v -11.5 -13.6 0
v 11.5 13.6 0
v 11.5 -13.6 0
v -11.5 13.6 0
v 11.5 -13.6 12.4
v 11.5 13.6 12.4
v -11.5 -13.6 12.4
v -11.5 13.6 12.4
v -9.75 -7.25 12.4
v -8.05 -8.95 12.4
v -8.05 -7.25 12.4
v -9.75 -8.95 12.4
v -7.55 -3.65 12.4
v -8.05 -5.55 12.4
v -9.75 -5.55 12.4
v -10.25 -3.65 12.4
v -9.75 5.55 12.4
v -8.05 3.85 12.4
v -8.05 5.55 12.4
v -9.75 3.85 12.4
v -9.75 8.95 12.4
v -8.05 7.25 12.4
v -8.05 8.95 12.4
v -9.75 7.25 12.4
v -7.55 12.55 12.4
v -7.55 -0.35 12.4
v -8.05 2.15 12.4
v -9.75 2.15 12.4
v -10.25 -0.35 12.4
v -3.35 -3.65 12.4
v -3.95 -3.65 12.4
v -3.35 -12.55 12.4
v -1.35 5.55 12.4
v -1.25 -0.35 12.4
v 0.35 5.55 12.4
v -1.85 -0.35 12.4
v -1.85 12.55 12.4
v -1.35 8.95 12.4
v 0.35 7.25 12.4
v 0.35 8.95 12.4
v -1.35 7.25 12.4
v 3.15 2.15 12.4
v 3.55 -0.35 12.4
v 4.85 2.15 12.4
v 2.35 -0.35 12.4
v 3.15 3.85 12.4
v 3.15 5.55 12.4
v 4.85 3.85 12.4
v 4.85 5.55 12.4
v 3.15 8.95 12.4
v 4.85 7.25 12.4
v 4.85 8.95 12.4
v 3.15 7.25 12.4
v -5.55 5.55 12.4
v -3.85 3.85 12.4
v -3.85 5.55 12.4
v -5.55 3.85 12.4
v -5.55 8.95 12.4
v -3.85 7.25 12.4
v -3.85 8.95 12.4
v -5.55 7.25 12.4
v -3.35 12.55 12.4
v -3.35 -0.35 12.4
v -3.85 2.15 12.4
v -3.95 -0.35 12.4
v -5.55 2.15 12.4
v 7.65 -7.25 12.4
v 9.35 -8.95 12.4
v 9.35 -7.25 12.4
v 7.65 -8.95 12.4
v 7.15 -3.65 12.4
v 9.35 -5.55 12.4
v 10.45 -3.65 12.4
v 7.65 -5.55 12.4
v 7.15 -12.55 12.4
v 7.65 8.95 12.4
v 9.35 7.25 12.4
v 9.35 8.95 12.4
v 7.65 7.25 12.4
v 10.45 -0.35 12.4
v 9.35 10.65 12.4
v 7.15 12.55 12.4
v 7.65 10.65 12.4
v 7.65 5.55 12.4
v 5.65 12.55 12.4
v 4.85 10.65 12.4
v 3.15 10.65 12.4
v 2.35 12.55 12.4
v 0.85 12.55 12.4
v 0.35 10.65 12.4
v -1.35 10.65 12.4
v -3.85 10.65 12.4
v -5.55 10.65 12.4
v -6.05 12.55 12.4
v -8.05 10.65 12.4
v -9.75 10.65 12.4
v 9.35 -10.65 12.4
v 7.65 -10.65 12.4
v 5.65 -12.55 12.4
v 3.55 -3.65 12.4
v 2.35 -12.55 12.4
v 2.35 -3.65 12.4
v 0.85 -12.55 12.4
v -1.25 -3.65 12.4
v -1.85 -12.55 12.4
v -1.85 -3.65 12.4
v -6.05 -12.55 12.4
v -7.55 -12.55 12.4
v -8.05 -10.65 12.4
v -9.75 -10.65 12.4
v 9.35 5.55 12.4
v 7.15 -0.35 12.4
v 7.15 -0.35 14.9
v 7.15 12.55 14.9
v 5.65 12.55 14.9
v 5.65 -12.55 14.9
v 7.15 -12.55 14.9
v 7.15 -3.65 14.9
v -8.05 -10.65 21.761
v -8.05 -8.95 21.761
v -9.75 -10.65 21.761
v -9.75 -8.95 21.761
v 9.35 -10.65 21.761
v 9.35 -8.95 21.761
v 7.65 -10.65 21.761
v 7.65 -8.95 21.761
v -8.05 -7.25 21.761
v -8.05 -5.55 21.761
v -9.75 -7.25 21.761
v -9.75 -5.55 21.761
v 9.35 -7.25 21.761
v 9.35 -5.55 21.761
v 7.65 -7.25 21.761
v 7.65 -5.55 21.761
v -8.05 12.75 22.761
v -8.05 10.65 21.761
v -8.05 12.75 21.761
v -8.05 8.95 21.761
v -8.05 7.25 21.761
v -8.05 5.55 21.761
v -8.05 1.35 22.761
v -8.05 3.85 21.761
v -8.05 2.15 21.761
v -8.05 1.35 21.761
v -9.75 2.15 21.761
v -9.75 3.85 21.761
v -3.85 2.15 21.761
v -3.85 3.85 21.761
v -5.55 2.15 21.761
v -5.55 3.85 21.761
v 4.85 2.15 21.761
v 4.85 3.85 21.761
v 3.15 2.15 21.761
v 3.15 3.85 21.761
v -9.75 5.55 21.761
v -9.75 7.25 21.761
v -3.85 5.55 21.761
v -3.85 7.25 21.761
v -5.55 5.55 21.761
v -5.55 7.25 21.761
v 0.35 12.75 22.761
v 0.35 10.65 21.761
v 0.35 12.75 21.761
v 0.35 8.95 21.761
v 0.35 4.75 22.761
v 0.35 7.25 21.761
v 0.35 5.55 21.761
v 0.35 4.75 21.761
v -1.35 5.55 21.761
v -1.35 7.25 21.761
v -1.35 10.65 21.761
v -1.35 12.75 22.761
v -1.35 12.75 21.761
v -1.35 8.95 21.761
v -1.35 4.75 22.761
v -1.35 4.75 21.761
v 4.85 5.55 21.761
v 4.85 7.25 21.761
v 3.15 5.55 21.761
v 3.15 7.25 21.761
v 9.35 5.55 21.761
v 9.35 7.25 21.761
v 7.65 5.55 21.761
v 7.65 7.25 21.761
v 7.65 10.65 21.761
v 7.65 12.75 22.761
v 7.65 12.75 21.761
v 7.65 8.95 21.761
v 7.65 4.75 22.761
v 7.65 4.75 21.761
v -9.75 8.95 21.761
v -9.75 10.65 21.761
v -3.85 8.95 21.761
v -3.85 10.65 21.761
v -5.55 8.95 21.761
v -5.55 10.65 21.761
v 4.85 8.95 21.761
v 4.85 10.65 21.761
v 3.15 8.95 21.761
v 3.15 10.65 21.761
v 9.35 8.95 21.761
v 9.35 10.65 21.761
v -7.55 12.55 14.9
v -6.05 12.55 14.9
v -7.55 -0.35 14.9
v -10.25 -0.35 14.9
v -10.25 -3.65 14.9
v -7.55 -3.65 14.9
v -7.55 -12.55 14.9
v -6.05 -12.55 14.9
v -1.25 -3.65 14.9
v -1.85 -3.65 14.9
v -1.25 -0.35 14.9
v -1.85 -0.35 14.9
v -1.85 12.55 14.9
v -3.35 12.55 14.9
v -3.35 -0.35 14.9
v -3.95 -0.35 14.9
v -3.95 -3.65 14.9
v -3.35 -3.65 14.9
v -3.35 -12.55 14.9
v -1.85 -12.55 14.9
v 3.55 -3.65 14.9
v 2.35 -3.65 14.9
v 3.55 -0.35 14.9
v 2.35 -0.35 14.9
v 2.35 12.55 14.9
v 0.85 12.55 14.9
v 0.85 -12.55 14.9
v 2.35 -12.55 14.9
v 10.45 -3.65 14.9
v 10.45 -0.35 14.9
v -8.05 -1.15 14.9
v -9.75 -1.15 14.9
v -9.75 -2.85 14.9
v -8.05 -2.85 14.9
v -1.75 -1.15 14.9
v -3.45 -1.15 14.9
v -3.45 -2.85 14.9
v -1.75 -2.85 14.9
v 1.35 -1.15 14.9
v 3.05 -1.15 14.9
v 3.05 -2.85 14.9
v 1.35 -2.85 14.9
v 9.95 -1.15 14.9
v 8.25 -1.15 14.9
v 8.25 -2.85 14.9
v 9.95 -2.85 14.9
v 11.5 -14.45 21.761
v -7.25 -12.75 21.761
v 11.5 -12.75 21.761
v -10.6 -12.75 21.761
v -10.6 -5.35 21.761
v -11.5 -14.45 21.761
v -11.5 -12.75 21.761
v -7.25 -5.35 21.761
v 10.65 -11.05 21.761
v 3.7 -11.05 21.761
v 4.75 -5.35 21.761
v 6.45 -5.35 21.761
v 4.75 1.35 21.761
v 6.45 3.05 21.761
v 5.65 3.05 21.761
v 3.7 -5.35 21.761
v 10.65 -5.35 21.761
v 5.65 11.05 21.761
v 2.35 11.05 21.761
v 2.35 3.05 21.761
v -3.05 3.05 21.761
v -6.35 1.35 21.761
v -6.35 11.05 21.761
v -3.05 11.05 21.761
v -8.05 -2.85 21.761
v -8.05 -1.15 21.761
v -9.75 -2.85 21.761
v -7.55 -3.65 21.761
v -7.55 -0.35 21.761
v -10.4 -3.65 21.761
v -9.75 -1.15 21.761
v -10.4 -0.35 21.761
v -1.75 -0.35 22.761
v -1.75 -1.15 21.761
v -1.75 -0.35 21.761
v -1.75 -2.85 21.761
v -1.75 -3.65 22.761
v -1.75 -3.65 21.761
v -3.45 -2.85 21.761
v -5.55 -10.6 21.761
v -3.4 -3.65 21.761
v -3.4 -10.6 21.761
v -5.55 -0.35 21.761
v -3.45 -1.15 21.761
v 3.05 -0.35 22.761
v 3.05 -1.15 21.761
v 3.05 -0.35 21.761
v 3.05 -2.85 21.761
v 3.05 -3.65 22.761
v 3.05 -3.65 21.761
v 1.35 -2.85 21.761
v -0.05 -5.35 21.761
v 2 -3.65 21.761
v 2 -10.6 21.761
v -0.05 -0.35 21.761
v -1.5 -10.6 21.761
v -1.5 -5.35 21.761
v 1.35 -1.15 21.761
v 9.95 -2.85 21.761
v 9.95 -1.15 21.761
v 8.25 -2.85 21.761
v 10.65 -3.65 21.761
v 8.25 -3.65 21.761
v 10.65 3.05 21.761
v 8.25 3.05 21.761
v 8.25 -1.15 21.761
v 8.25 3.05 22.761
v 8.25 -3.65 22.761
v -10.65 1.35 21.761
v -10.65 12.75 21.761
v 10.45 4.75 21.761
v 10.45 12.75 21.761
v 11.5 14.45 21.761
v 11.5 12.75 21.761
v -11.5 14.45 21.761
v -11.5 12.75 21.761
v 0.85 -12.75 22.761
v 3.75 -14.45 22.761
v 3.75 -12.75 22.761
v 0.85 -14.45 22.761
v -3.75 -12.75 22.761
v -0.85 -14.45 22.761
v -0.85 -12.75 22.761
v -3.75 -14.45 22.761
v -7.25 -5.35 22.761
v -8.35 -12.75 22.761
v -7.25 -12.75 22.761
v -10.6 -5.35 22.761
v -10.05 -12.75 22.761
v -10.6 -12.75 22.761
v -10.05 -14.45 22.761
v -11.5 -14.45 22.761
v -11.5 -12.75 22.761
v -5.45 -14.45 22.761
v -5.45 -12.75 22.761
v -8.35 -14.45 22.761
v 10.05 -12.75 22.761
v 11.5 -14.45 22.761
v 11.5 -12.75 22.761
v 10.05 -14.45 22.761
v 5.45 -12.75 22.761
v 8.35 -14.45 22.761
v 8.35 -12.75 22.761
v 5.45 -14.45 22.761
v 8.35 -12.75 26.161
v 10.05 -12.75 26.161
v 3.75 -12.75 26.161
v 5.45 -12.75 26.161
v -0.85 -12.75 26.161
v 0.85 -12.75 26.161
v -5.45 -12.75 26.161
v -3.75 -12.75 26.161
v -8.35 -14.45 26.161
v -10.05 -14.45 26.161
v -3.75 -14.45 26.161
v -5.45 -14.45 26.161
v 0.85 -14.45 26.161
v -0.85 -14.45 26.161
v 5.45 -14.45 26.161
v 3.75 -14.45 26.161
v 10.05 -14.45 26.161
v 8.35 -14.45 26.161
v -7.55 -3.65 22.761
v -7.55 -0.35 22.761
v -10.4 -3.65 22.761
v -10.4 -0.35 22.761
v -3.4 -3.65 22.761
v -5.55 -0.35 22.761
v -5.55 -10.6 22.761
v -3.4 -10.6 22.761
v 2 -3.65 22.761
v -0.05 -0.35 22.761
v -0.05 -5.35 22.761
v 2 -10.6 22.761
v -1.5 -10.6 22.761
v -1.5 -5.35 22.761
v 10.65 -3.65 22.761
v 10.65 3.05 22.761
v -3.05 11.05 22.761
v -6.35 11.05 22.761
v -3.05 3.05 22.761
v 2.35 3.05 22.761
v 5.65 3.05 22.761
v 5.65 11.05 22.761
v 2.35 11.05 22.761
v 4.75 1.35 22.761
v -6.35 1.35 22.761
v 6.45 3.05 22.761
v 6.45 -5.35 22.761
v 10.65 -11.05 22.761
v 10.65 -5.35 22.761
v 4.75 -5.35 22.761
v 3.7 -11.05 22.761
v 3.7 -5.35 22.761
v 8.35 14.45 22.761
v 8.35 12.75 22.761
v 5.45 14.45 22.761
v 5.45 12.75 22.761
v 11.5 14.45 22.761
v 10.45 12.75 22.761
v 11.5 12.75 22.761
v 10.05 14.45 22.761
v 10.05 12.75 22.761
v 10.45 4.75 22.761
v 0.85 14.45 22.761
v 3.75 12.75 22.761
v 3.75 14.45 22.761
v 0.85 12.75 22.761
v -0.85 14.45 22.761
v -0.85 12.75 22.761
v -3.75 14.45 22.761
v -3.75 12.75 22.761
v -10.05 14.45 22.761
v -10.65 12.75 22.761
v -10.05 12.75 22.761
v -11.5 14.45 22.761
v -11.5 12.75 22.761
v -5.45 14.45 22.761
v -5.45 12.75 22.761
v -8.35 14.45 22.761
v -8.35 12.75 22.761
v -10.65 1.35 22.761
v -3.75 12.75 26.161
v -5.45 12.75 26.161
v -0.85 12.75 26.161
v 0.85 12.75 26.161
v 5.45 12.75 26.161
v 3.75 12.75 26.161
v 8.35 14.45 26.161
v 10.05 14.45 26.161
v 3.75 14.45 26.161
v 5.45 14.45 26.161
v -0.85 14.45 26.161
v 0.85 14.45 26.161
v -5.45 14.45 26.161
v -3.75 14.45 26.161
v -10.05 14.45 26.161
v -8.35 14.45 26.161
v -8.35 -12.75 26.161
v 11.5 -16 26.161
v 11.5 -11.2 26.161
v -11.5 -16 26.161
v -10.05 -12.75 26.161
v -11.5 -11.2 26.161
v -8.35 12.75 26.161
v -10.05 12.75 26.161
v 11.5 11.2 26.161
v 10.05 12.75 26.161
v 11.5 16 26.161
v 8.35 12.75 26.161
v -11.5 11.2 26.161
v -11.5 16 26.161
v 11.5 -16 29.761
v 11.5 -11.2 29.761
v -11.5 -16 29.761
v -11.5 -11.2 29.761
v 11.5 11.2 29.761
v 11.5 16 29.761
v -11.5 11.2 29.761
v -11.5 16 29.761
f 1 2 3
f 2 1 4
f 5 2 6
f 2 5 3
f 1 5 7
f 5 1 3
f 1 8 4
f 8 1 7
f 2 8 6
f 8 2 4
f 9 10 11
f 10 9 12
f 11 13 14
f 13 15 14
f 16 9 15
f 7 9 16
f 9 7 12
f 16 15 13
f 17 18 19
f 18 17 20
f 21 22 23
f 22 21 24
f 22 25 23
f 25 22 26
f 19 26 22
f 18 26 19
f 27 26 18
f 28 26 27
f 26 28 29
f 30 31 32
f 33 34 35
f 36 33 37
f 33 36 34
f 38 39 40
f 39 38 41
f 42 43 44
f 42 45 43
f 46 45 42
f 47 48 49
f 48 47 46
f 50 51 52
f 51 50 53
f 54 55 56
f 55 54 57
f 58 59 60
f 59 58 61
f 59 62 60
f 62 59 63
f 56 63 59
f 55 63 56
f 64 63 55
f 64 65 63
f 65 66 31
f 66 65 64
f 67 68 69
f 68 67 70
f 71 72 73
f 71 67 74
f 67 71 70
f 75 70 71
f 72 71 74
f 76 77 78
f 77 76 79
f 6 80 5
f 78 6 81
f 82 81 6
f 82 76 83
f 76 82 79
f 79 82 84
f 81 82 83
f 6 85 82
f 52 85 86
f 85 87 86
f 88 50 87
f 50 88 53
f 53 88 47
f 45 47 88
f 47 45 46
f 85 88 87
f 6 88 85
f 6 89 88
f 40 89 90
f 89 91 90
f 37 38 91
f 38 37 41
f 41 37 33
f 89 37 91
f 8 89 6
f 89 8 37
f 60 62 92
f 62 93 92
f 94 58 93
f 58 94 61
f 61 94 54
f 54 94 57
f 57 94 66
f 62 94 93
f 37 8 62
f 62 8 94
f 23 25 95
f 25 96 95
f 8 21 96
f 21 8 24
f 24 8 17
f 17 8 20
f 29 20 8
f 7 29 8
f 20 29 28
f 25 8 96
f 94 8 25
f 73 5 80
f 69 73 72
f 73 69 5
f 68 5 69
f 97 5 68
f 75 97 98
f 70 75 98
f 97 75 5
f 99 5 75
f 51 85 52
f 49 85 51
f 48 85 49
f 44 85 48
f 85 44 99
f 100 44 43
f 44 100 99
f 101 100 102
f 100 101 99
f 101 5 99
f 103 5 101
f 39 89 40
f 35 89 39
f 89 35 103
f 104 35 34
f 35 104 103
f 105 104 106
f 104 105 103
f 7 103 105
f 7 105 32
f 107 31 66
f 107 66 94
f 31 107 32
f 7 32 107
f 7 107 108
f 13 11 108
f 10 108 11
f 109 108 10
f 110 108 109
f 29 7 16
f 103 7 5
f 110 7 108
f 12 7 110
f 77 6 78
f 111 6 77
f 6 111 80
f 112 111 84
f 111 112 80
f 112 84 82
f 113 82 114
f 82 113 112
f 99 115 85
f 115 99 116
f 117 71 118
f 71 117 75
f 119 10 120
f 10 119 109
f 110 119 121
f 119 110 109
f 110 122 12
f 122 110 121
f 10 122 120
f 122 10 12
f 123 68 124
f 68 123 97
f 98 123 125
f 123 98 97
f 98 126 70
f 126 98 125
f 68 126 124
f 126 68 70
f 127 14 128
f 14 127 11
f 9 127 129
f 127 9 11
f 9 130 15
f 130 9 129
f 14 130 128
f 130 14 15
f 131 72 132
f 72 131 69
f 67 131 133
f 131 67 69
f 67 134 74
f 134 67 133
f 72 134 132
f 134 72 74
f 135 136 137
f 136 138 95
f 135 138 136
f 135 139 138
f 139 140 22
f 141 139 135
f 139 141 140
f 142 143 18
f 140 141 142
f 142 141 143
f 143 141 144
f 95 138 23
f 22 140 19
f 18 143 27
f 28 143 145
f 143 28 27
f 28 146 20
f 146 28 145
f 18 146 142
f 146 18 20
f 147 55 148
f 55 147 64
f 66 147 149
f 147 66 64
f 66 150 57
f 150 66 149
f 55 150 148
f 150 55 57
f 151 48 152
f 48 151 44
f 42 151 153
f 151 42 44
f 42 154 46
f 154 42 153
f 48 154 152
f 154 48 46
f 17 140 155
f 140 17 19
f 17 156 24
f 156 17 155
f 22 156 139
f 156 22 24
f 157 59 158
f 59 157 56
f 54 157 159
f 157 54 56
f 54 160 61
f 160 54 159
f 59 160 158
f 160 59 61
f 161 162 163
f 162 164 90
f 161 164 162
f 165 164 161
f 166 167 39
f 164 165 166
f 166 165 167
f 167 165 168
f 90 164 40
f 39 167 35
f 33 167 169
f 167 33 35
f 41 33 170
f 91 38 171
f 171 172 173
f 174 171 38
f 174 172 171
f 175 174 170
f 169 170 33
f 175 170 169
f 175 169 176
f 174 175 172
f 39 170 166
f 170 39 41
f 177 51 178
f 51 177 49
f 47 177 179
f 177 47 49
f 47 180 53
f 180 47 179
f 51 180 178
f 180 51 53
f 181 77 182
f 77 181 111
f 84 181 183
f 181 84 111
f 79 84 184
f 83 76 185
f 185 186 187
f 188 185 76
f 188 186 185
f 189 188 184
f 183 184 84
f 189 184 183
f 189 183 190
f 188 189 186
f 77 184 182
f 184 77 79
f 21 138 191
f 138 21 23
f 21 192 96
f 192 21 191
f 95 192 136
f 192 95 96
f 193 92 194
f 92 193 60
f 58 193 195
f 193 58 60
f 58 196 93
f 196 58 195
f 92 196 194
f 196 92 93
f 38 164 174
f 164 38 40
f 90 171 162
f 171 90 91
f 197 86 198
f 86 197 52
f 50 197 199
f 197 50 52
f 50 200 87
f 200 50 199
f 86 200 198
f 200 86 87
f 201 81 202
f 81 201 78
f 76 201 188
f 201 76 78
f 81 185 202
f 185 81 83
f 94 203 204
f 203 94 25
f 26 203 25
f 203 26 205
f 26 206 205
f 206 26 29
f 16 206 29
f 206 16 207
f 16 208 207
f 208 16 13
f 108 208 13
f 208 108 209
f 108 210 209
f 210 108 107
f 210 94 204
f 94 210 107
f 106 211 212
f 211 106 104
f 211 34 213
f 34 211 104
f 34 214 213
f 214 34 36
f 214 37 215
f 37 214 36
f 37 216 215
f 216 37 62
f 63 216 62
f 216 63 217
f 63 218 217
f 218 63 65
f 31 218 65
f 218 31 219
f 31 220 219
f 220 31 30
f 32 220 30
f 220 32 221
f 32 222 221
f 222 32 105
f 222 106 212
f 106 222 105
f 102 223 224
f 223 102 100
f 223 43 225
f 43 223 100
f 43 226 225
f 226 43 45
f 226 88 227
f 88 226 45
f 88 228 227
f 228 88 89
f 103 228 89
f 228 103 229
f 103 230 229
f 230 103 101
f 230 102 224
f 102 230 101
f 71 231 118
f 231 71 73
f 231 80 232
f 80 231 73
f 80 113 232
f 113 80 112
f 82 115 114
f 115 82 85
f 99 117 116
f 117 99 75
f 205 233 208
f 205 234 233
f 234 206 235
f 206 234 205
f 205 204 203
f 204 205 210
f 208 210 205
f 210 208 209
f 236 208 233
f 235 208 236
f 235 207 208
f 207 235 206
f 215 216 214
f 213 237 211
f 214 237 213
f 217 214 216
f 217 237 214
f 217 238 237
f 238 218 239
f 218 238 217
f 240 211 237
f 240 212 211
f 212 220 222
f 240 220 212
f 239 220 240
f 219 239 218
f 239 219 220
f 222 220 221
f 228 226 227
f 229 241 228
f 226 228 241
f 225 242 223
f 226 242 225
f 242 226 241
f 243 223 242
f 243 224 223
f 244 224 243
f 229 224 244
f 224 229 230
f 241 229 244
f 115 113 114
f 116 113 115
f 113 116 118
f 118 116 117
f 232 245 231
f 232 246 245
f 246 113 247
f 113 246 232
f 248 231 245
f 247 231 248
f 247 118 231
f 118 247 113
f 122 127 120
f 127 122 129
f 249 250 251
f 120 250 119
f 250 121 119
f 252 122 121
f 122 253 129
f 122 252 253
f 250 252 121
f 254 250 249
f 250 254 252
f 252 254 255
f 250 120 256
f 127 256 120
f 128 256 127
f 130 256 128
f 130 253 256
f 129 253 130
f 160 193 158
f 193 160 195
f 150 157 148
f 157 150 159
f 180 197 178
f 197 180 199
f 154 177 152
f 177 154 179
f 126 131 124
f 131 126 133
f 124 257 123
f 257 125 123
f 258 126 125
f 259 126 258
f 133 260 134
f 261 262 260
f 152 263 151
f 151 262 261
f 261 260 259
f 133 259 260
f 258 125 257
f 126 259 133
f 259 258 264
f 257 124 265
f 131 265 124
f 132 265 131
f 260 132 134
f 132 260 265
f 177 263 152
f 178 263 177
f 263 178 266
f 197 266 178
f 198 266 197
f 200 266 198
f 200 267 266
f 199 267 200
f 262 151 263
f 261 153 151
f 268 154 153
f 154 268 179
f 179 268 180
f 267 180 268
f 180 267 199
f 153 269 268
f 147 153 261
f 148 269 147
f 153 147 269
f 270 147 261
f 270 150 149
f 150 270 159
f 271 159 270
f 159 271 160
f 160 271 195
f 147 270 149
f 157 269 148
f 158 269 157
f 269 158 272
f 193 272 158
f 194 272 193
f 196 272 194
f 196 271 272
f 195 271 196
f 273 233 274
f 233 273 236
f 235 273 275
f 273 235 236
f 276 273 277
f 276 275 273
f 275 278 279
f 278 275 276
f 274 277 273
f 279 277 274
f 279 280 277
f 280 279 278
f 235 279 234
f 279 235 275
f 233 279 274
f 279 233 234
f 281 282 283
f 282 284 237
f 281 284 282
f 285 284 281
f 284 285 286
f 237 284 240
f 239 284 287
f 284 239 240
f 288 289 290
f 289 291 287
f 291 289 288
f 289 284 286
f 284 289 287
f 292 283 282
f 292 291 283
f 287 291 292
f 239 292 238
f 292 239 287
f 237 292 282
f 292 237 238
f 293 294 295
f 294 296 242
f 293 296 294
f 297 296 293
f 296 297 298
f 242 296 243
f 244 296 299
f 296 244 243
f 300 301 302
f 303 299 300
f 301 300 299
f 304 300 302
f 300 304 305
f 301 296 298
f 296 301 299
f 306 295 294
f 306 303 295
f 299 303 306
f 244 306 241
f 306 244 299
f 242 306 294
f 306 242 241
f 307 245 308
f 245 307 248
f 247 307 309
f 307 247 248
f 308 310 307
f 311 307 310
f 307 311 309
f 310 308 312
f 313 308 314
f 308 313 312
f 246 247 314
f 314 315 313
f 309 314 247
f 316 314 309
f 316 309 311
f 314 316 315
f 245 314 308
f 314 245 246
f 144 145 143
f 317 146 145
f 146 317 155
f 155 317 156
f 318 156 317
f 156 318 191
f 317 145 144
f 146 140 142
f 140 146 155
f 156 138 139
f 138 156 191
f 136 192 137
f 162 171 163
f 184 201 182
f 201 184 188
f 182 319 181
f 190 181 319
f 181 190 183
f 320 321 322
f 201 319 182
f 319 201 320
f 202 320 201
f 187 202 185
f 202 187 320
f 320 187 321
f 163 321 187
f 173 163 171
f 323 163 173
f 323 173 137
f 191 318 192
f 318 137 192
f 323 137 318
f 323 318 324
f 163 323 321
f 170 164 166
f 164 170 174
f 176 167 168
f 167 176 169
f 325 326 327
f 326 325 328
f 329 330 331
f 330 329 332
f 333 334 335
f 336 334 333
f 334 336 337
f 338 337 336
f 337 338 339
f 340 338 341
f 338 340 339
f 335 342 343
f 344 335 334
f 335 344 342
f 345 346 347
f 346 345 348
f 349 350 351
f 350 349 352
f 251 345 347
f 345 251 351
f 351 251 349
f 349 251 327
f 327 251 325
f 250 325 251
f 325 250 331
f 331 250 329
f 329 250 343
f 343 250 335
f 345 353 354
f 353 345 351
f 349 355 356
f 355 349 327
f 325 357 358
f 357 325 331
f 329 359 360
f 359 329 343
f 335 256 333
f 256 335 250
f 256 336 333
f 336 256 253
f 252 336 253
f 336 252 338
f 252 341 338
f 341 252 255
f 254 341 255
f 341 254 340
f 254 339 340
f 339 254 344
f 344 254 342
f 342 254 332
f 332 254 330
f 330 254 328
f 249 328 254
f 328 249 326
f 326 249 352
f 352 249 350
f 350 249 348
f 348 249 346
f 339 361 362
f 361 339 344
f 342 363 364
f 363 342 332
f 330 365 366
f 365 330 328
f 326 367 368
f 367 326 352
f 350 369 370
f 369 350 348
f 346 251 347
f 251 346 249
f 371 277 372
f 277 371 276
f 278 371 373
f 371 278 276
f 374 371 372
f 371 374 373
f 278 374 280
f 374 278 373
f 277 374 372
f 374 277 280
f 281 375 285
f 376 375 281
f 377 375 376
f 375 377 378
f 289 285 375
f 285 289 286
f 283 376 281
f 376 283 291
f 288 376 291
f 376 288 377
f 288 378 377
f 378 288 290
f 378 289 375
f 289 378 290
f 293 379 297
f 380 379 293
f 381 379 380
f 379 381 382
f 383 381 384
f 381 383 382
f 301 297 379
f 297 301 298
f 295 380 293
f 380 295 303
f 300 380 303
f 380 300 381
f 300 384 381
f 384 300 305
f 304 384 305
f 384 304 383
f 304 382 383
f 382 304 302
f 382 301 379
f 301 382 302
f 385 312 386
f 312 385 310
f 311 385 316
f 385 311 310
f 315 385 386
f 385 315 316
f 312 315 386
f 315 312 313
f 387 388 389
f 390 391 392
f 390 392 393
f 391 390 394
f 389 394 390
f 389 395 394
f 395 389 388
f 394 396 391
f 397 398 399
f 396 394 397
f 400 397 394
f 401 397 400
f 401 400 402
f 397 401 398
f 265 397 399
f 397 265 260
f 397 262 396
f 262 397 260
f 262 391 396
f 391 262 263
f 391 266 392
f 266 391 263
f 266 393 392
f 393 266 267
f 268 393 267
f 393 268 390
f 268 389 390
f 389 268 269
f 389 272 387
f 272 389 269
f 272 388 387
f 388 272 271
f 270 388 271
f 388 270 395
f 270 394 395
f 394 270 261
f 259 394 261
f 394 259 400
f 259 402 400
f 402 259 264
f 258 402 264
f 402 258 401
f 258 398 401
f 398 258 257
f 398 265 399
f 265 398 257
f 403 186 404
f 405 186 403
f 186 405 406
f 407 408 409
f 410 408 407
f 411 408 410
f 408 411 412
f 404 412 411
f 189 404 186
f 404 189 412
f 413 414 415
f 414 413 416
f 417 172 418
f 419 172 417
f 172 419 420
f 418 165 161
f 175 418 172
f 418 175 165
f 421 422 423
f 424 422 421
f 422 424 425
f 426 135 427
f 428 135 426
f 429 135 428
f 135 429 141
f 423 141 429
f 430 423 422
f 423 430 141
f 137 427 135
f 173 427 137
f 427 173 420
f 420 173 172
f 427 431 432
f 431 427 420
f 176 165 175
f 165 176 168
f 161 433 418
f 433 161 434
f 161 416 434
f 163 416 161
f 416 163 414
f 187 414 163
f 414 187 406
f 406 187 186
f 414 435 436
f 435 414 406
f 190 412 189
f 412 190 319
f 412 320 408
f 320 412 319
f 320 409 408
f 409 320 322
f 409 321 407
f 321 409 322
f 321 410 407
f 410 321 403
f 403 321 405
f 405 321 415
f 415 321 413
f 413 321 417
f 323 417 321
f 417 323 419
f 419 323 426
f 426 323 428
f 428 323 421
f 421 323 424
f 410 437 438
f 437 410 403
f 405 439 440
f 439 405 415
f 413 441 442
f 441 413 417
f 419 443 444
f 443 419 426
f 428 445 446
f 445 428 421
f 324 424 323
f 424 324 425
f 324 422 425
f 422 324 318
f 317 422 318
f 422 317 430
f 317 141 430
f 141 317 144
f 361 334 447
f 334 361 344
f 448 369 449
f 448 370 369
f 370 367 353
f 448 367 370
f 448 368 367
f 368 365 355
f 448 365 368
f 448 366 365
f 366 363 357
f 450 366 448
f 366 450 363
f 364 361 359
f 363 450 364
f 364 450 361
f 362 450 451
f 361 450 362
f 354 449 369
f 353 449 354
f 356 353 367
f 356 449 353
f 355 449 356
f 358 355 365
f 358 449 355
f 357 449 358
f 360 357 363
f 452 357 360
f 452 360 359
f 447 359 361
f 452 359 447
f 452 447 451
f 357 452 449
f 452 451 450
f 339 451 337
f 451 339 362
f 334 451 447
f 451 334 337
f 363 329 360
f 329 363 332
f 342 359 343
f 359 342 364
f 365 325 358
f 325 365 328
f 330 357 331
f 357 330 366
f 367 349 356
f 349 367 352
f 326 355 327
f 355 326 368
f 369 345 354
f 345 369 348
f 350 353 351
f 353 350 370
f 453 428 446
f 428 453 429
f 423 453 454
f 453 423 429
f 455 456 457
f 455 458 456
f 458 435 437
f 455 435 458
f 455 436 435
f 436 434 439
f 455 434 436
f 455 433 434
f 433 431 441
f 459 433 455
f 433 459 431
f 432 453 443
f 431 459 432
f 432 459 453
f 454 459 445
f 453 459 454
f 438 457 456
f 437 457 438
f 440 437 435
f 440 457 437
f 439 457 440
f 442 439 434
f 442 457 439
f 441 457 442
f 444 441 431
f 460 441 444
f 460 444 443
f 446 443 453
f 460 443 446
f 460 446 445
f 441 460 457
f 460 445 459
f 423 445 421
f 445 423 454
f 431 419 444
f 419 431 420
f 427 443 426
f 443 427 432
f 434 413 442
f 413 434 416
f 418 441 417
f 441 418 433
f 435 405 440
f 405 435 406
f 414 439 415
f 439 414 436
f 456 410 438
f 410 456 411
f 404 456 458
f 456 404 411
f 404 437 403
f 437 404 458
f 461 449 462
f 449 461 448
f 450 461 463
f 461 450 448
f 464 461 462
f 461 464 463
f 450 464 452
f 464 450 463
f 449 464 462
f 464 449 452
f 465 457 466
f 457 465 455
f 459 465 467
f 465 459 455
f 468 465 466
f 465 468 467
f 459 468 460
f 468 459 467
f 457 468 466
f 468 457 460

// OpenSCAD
// Generated by SolidPython 0.4.2 on 2020-09-29 23:21:28
//!OpenSCAD

scale(v = 0.0100000000) {
	translate(v = [-1150, -1360, 0]) {
		union() {
			color(c = [0.4000000000, 0.4000000000, 0.4000000000]) {
				translate(v = [0, 0, 0]) {
					linear_extrude(height = 1000.0000000000) {
						polygon(paths = [[0, 1, 2, 3]], points = [[0, 0], [0, 2720], [2300, 2720], [2300, 0]]);
					}
				}
			}
			color(c = [0.2000000000, 0.6000000000, 0.2000000000]) {
				translate(v = [0, 0, 1000.0000000000]) {
					linear_extrude(height = 120.0000000000) {
						polygon(paths = [[0, 1, 2, 3]], points = [[0, 1305], [0, 2720], [2300, 2720], [2300, 1305]]);
					}
				}
			}
			color(c = [0.4000000000, 0.4000000000, 0.4000000000]) {
				translate(v = [0, 0, 1000.0000000000]) {
					linear_extrude(height = 120.0000000000) {
						polygon(paths = [[0, 1, 2, 3]], points = [[0, 0], [0, 1305], [2300, 1305], [2300, 0]]);
					}
				}
			}
			color(c = [0.9000000000, 0.6000000000, 0.6000000000]) {
				translate(v = [0, 0, 1120.0000000000]) {
					linear_extrude(height = 120.0000000000) {
						polygon(paths = [[0, 1, 2, 3]], points = [[135, 1485], [135, 2485], [395, 2485], [395, 1485]]);
					}
				}
			}
			color(c = [0.9000000000, 0.6000000000, 0.6000000000]) {
				translate(v = [0, 0, 1120.0000000000]) {
					linear_extrude(height = 120.0000000000) {
						polygon(paths = [[0, 1, 2, 3]], points = [[545, 1485], [545, 2485], [815, 2485], [815, 1485]]);
					}
				}
			}
			color(c = [0.9000000000, 0.6000000000, 0.6000000000]) {
				translate(v = [0, 0, 1120.0000000000]) {
					linear_extrude(height = 120.0000000000) {
						polygon(paths = [[0, 1, 2, 3]], points = [[965, 1485], [965, 2485], [1235, 2485], [1235, 1485]]);
					}
				}
			}
			color(c = [0.9000000000, 0.6000000000, 0.6000000000]) {
				translate(v = [0, 0, 1120.0000000000]) {
					linear_extrude(height = 120.0000000000) {
						polygon(paths = [[0, 1, 2, 3]], points = [[1385, 1485], [1385, 2485], [1715, 2485], [1715, 1485]]);
					}
				}
			}
			color(c = [0.9000000000, 0.6000000000, 0.6000000000]) {
				translate(v = [0, 0, 1120.0000000000]) {
					linear_extrude(height = 120.0000000000) {
						polygon(paths = [[0, 1, 2, 3]], points = [[1865, 1485], [1865, 2485], [2165, 2485], [2165, 1485]]);
					}
				}
			}
			color(c = [0.9000000000, 0.6000000000, 0.9000000000]) {
				translate(v = [0, 0, 1120.0000000000]) {
					linear_extrude(height = 120.0000000000) {
						polygon(paths = [[0, 1, 2, 3]], points = [[135, 235], [135, 885], [395, 885], [395, 235]]);
					}
				}
			}
			color(c = [0.9000000000, 0.6000000000, 0.9000000000]) {
				translate(v = [0, 0, 1120.0000000000]) {
					linear_extrude(height = 120.0000000000) {
						polygon(paths = [[0, 1, 2, 3]], points = [[545, 235], [545, 885], [815, 885], [815, 235]]);
					}
				}
			}
			color(c = [0.9000000000, 0.6000000000, 0.9000000000]) {
				translate(v = [0, 0, 1120.0000000000]) {
					linear_extrude(height = 120.0000000000) {
						polygon(paths = [[0, 1, 2, 3]], points = [[965, 235], [965, 885], [1235, 885], [1235, 235]]);
					}
				}
			}
			color(c = [0.9000000000, 0.6000000000, 0.9000000000]) {
				translate(v = [0, 0, 1120.0000000000]) {
					linear_extrude(height = 120.0000000000) {
						polygon(paths = [[0, 1, 2, 3]], points = [[1385, 235], [1385, 885], [1715, 885], [1715, 235]]);
					}
				}
			}
			color(c = [0.9000000000, 0.6000000000, 0.9000000000]) {
				translate(v = [0, 0, 1120.0000000000]) {
					linear_extrude(height = 120.0000000000) {
						polygon(paths = [[0, 1, 2, 3]], points = [[1865, 235], [1865, 885], [2165, 885], [2165, 235]]);
					}
				}
			}
			color(c = [0.2000000000, 0.6000000000, 0.2000000000]) {
				translate(v = [0, 0, 1120.0000000000]) {
					linear_extrude(height = 120.0000000000) {
						difference() {
							polygon(paths = [[0, 1, 2, 3]], points = [[0, 1305], [0, 2720], [2300, 2720], [2300, 1305]]);
							polygon(paths = [[0, 1, 2, 3]], points = [[135, 1485], [395, 1485], [395, 2485], [135, 2485]]);
							polygon(paths = [[0, 1, 2, 3]], points = [[545, 1485], [815, 1485], [815, 2485], [545, 2485]]);
							polygon(paths = [[0, 1, 2, 3]], points = [[965, 1485], [1235, 1485], [1235, 2485], [965, 2485]]);
							polygon(paths = [[0, 1, 2, 3]], points = [[1385, 1485], [1715, 1485], [1715, 2485], [1385, 2485]]);
							polygon(paths = [[0, 1, 2, 3]], points = [[1865, 1485], [2165, 1485], [2165, 2485], [1865, 2485]]);
						}
					}
				}
			}
			color(c = [0.4000000000, 0.4000000000, 0.4000000000]) {
				translate(v = [0, 0, 1120.0000000000]) {
					linear_extrude(height = 120.0000000000) {
						difference() {
							polygon(paths = [[0, 1, 2, 3]], points = [[0, 0], [0, 1305], [2300, 1305], [2300, 0]]);
							polygon(paths = [[0, 1, 2, 3]], points = [[135, 235], [395, 235], [395, 885], [135, 885]]);
							polygon(paths = [[0, 1, 2, 3]], points = [[545, 235], [815, 235], [815, 885], [545, 885]]);
							polygon(paths = [[0, 1, 2, 3]], points = [[965, 235], [1235, 235], [1235, 885], [965, 885]]);
							polygon(paths = [[0, 1, 2, 3]], points = [[1385, 235], [1715, 235], [1715, 885], [1385, 885]]);
							polygon(paths = [[0, 1, 2, 3]], points = [[1865, 235], [2165, 235], [2165, 885], [1865, 885]]);
						}
					}
				}
			}
			color(c = [0.1000000000, 0.1000000000, 0.1000000000]) {
				translate(v = [0, 0, 1240.0000000000]) {
					linear_extrude(height = 70.0000000000) {
						polygon(paths = [[0, 1, 2, 3]], points = [[175, 295], [175, 465], [345, 465], [345, 295]]);
					}
				}
			}
			color(c = [0.1000000000, 0.1000000000, 0.1000000000]) {
				translate(v = [0, 0, 1240.0000000000]) {
					linear_extrude(height = 70.0000000000) {
						polygon(paths = [[0, 1, 2, 3]], points = [[1915, 295], [1915, 465], [2085, 465], [2085, 295]]);
					}
				}
			}
			color(c = [0.1000000000, 0.1000000000, 0.1000000000]) {
				translate(v = [0, 0, 1240.0000000000]) {
					linear_extrude(height = 70.0000000000) {
						polygon(paths = [[0, 1, 2, 3]], points = [[175, 635], [175, 805], [345, 805], [345, 635]]);
					}
				}
			}
			color(c = [0.1000000000, 0.1000000000, 0.1000000000]) {
				translate(v = [0, 0, 1240.0000000000]) {
					linear_extrude(height = 70.0000000000) {
						polygon(paths = [[0, 1, 2, 3]], points = [[1915, 635], [1915, 805], [2085, 805], [2085, 635]]);
					}
				}
			}
			color(c = [0.1000000000, 0.1000000000, 0.1000000000]) {
				translate(v = [0, 0, 1240.0000000000]) {
					linear_extrude(height = 70.0000000000) {
						polygon(paths = [[0, 1, 2, 3]], points = [[175, 1575], [175, 1745], [345, 1745], [345, 1575]]);
					}
				}
			}
			color(c = [0.1000000000, 0.1000000000, 0.1000000000]) {
				translate(v = [0, 0, 1240.0000000000]) {
					linear_extrude(height = 70.0000000000) {
						polygon(paths = [[0, 1, 2, 3]], points = [[595, 1575], [595, 1745], [765, 1745], [765, 1575]]);
					}
				}
			}
			color(c = [0.1000000000, 0.1000000000, 0.1000000000]) {
				translate(v = [0, 0, 1240.0000000000]) {
					linear_extrude(height = 70.0000000000) {
						polygon(paths = [[0, 1, 2, 3]], points = [[1465, 1575], [1465, 1745], [1635, 1745], [1635, 1575]]);
					}
				}
			}
			color(c = [0.1000000000, 0.1000000000, 0.1000000000]) {
				translate(v = [0, 0, 1240.0000000000]) {
					linear_extrude(height = 70.0000000000) {
						polygon(paths = [[0, 1, 2, 3]], points = [[175, 1915], [175, 2085], [345, 2085], [345, 1915]]);
					}
				}
			}
			color(c = [0.1000000000, 0.1000000000, 0.1000000000]) {
				translate(v = [0, 0, 1240.0000000000]) {
					linear_extrude(height = 70.0000000000) {
						polygon(paths = [[0, 1, 2, 3]], points = [[595, 1915], [595, 2085], [765, 2085], [765, 1915]]);
					}
				}
			}
			color(c = [0.1000000000, 0.1000000000, 0.1000000000]) {
				translate(v = [0, 0, 1240.0000000000]) {
					linear_extrude(height = 70.0000000000) {
						polygon(paths = [[0, 1, 2, 3]], points = [[1015, 1915], [1015, 2085], [1185, 2085], [1185, 1915]]);
					}
				}
			}
			color(c = [0.1000000000, 0.1000000000, 0.1000000000]) {
				translate(v = [0, 0, 1240.0000000000]) {
					linear_extrude(height = 70.0000000000) {
						polygon(paths = [[0, 1, 2, 3]], points = [[1465, 1915], [1465, 2085], [1635, 2085], [1635, 1915]]);
					}
				}
			}
			color(c = [0.1000000000, 0.1000000000, 0.1000000000]) {
				translate(v = [0, 0, 1240.0000000000]) {
					linear_extrude(height = 70.0000000000) {
						polygon(paths = [[0, 1, 2, 3]], points = [[1915, 1915], [1915, 2085], [2085, 2085], [2085, 1915]]);
					}
				}
			}
			color(c = [0.1000000000, 0.1000000000, 0.1000000000]) {
				translate(v = [0, 0, 1240.0000000000]) {
					linear_extrude(height = 70.0000000000) {
						polygon(paths = [[0, 1, 2, 3]], points = [[175, 2255], [175, 2425], [345, 2425], [345, 2255]]);
					}
				}
			}
			color(c = [0.1000000000, 0.1000000000, 0.1000000000]) {
				translate(v = [0, 0, 1240.0000000000]) {
					linear_extrude(height = 70.0000000000) {
						polygon(paths = [[0, 1, 2, 3]], points = [[595, 2255], [595, 2425], [765, 2425], [765, 2255]]);
					}
				}
			}
			color(c = [0.1000000000, 0.1000000000, 0.1000000000]) {
				translate(v = [0, 0, 1240.0000000000]) {
					linear_extrude(height = 70.0000000000) {
						polygon(paths = [[0, 1, 2, 3]], points = [[1015, 2255], [1015, 2425], [1185, 2425], [1185, 2255]]);
					}
				}
			}
			color(c = [0.1000000000, 0.1000000000, 0.1000000000]) {
				translate(v = [0, 0, 1240.0000000000]) {
					linear_extrude(height = 70.0000000000) {
						polygon(paths = [[0, 1, 2, 3]], points = [[1465, 2255], [1465, 2425], [1635, 2425], [1635, 2255]]);
					}
				}
			}
			color(c = [0.1000000000, 0.1000000000, 0.1000000000]) {
				translate(v = [0, 0, 1240.0000000000]) {
					linear_extrude(height = 70.0000000000) {
						polygon(paths = [[0, 1, 2, 3]], points = [[1915, 2255], [1915, 2425], [2085, 2425], [2085, 2255]]);
					}
				}
			}
			color(c = [1.0000000000, 1.0000000000, 1.0000000000]) {
				translate(v = [0, 0, 1240.0000000000]) {
					linear_extrude(height = 70.0000000000) {
						polygon(paths = [[0, 1, 2, 3, 4, 5, 6, 7]], points = [[395, 105], [395, 995], [125, 995], [125, 1325], [395, 1325], [395, 2615], [545, 2615], [545, 105]]);
					}
				}
			}
			color(c = [1.0000000000, 1.0000000000, 1.0000000000]) {
				translate(v = [0, 0, 1240.0000000000]) {
					linear_extrude(height = 70.0000000000) {
						polygon(paths = [[0, 1, 2, 3, 4, 5, 6, 7, 8, 9, 10, 11]], points = [[815, 105], [815, 995], [755, 995], [755, 1325], [815, 1325], [815, 2615], [965, 2615], [965, 1325], [1025, 1325], [1025, 995], [965, 995], [965, 105]]);
					}
				}
			}
			color(c = [1.0000000000, 1.0000000000, 1.0000000000]) {
				translate(v = [0, 0, 1240.0000000000]) {
					linear_extrude(height = 70.0000000000) {
						polygon(paths = [[0, 1, 2, 3, 4, 5, 6, 7]], points = [[1235, 105], [1235, 2615], [1385, 2615], [1385, 1325], [1505, 1325], [1505, 995], [1385, 995], [1385, 105]]);
					}
				}
			}
			color(c = [1.0000000000, 1.0000000000, 1.0000000000]) {
				translate(v = [0, 0, 1240.0000000000]) {
					linear_extrude(height = 70.0000000000) {
						polygon(paths = [[0, 1, 2, 3, 4, 5, 6, 7]], points = [[1715, 105], [1715, 2615], [1865, 2615], [1865, 1325], [2195, 1325], [2195, 995], [1865, 995], [1865, 105]]);
					}
				}
			}
			color(c = [0.1000000000, 0.1000000000, 0.1000000000]) {
				translate(v = [0, 0, 1310.0000000000]) {
					linear_extrude(height = 180.0000000000) {
						polygon(paths = [[0, 1, 2, 3]], points = [[175, 295], [175, 465], [345, 465], [345, 295]]);
					}
				}
			}
			color(c = [0.1000000000, 0.1000000000, 0.1000000000]) {
				translate(v = [0, 0, 1310.0000000000]) {
					linear_extrude(height = 180.0000000000) {
						polygon(paths = [[0, 1, 2, 3]], points = [[1915, 295], [1915, 465], [2085, 465], [2085, 295]]);
					}
				}
			}
			color(c = [0.1000000000, 0.1000000000, 0.1000000000]) {
				translate(v = [0, 0, 1310.0000000000]) {
					linear_extrude(height = 180.0000000000) {
						polygon(paths = [[0, 1, 2, 3]], points = [[175, 635], [175, 805], [345, 805], [345, 635]]);
					}
				}
			}
			color(c = [0.1000000000, 0.1000000000, 0.1000000000]) {
				translate(v = [0, 0, 1310.0000000000]) {
					linear_extrude(height = 180.0000000000) {
						polygon(paths = [[0, 1, 2, 3]], points = [[1915, 635], [1915, 805], [2085, 805], [2085, 635]]);
					}
				}
			}
			color(c = [0.1000000000, 0.1000000000, 0.1000000000]) {
				translate(v = [0, 0, 1310.0000000000]) {
					linear_extrude(height = 180.0000000000) {
						polygon(paths = [[0, 1, 2, 3]], points = [[175, 1575], [175, 1745], [345, 1745], [345, 1575]]);
					}
				}
			}
			color(c = [0.1000000000, 0.1000000000, 0.1000000000]) {
				translate(v = [0, 0, 1310.0000000000]) {
					linear_extrude(height = 180.0000000000) {
						polygon(paths = [[0, 1, 2, 3]], points = [[595, 1575], [595, 1745], [765, 1745], [765, 1575]]);
					}
				}
			}
			color(c = [0.1000000000, 0.1000000000, 0.1000000000]) {
				translate(v = [0, 0, 1310.0000000000]) {
					linear_extrude(height = 180.0000000000) {
						polygon(paths = [[0, 1, 2, 3]], points = [[1465, 1575], [1465, 1745], [1635, 1745], [1635, 1575]]);
					}
				}
			}
			color(c = [0.1000000000, 0.1000000000, 0.1000000000]) {
				translate(v = [0, 0, 1310.0000000000]) {
					linear_extrude(height = 180.0000000000) {
						polygon(paths = [[0, 1, 2, 3]], points = [[175, 1915], [175, 2085], [345, 2085], [345, 1915]]);
					}
				}
			}
			color(c = [0.1000000000, 0.1000000000, 0.1000000000]) {
				translate(v = [0, 0, 1310.0000000000]) {
					linear_extrude(height = 180.0000000000) {
						polygon(paths = [[0, 1, 2, 3]], points = [[595, 1915], [595, 2085], [765, 2085], [765, 1915]]);
					}
				}
			}
			color(c = [0.1000000000, 0.1000000000, 0.1000000000]) {
				translate(v = [0, 0, 1310.0000000000]) {
					linear_extrude(height = 180.0000000000) {
						polygon(paths = [[0, 1, 2, 3]], points = [[1015, 1915], [1015, 2085], [1185, 2085], [1185, 1915]]);
					}
				}
			}
			color(c = [0.1000000000, 0.1000000000, 0.1000000000]) {
				translate(v = [0, 0, 1310.0000000000]) {
					linear_extrude(height = 180.0000000000) {
						polygon(paths = [[0, 1, 2, 3]], points = [[1465, 1915], [1465, 2085], [1635, 2085], [1635, 1915]]);
					}
				}
			}
			color(c = [0.1000000000, 0.1000000000, 0.1000000000]) {
				translate(v = [0, 0, 1310.0000000000]) {
					linear_extrude(height = 180.0000000000) {
						polygon(paths = [[0, 1, 2, 3]], points = [[1915, 1915], [1915, 2085], [2085, 2085], [2085, 1915]]);
					}
				}
			}
			color(c = [0.1000000000, 0.1000000000, 0.1000000000]) {
				translate(v = [0, 0, 1310.0000000000]) {
					linear_extrude(height = 180.0000000000) {
						polygon(paths = [[0, 1, 2, 3]], points = [[175, 2255], [175, 2425], [345, 2425], [345, 2255]]);
					}
				}
			}
			color(c = [0.1000000000, 0.1000000000, 0.1000000000]) {
				translate(v = [0, 0, 1310.0000000000]) {
					linear_extrude(height = 180.0000000000) {
						polygon(paths = [[0, 1, 2, 3]], points = [[595, 2255], [595, 2425], [765, 2425], [765, 2255]]);
					}
				}
			}
			color(c = [0.1000000000, 0.1000000000, 0.1000000000]) {
				translate(v = [0, 0, 1310.0000000000]) {
					linear_extrude(height = 180.0000000000) {
						polygon(paths = [[0, 1, 2, 3]], points = [[1015, 2255], [1015, 2425], [1185, 2425], [1185, 2255]]);
					}
				}
			}
			color(c = [0.1000000000, 0.1000000000, 0.1000000000]) {
				translate(v = [0, 0, 1310.0000000000]) {
					linear_extrude(height = 180.0000000000) {
						polygon(paths = [[0, 1, 2, 3]], points = [[1465, 2255], [1465, 2425], [1635, 2425], [1635, 2255]]);
					}
				}
			}
			color(c = [0.1000000000, 0.1000000000, 0.1000000000]) {
				translate(v = [0, 0, 1310.0000000000]) {
					linear_extrude(height = 180.0000000000) {
						polygon(paths = [[0, 1, 2, 3]], points = [[1915, 2255], [1915, 2425], [2085, 2425], [2085, 2255]]);
					}
				}
			}
			color(c = [0.7000000000, 0, 0]) {
				translate(v = [0, 0, 1310.0000000000]) {
					linear_extrude(height = 180.0000000000) {
						polygon(paths = [[0, 1, 2, 3, 4, 5, 6, 7]], points = [[395, 105], [395, 995], [125, 995], [125, 1325], [395, 1325], [395, 2615], [545, 2615], [545, 105]]);
					}
				}
			}
			color(c = [0.7000000000, 0, 0]) {
				translate(v = [0, 0, 1310.0000000000]) {
					linear_extrude(height = 180.0000000000) {
						polygon(paths = [[0, 1, 2, 3, 4, 5, 6, 7, 8, 9, 10, 11]], points = [[815, 105], [815, 995], [755, 995], [755, 1325], [815, 1325], [815, 2615], [965, 2615], [965, 1325], [1025, 1325], [1025, 995], [965, 995], [965, 105]]);
					}
				}
			}
			color(c = [0.7000000000, 0, 0]) {
				translate(v = [0, 0, 1310.0000000000]) {
					linear_extrude(height = 180.0000000000) {
						polygon(paths = [[0, 1, 2, 3, 4, 5, 6, 7]], points = [[1235, 105], [1235, 2615], [1385, 2615], [1385, 1325], [1505, 1325], [1505, 995], [1385, 995], [1385, 105]]);
					}
				}
			}
			color(c = [0.7000000000, 0, 0]) {
				translate(v = [0, 0, 1310.0000000000]) {
					linear_extrude(height = 180.0000000000) {
						polygon(paths = [[0, 1, 2, 3, 4, 5, 6, 7]], points = [[1715, 105], [1715, 2615], [1865, 2615], [1865, 1325], [2195, 1325], [2195, 995], [1865, 995], [1865, 105]]);
					}
				}
			}
			color(c = [0.1000000000, 0.1000000000, 0.1000000000]) {
				translate(v = [0, 0, 1490.0000000000]) {
					linear_extrude(height = 686.1000000000) {
						polygon(paths = [[0, 1, 2, 3]], points = [[175, 295], [175, 465], [345, 465], [345, 295]]);
					}
				}
			}
			color(c = [0.1000000000, 0.1000000000, 0.1000000000]) {
				translate(v = [0, 0, 1490.0000000000]) {
					linear_extrude(height = 686.1000000000) {
						polygon(paths = [[0, 1, 2, 3]], points = [[1915, 295], [1915, 465], [2085, 465], [2085, 295]]);
					}
				}
			}
			color(c = [0.1000000000, 0.1000000000, 0.1000000000]) {
				translate(v = [0, 0, 1490.0000000000]) {
					linear_extrude(height = 686.1000000000) {
						polygon(paths = [[0, 1, 2, 3]], points = [[175, 635], [175, 805], [345, 805], [345, 635]]);
					}
				}
			}
			color(c = [0.1000000000, 0.1000000000, 0.1000000000]) {
				translate(v = [0, 0, 1490.0000000000]) {
					linear_extrude(height = 686.1000000000) {
						polygon(paths = [[0, 1, 2, 3]], points = [[1915, 635], [1915, 805], [2085, 805], [2085, 635]]);
					}
				}
			}
			color(c = [0.1000000000, 0.1000000000, 0.1000000000]) {
				translate(v = [0, 0, 1490.0000000000]) {
					linear_extrude(height = 686.1000000000) {
						polygon(paths = [[0, 1, 2, 3]], points = [[175, 1075], [175, 1245], [345, 1245], [345, 1075]]);
					}
				}
			}
			color(c = [0.1000000000, 0.1000000000, 0.1000000000]) {
				translate(v = [0, 0, 1490.0000000000]) {
					linear_extrude(height = 686.1000000000) {
						polygon(paths = [[0, 1, 2, 3]], points = [[805, 1075], [805, 1245], [975, 1245], [975, 1075]]);
					}
				}
			}
			color(c = [0.1000000000, 0.1000000000, 0.1000000000]) {
				translate(v = [0, 0, 1490.0000000000]) {
					linear_extrude(height = 686.1000000000) {
						polygon(paths = [[0, 1, 2, 3]], points = [[1285, 1075], [1285, 1245], [1455, 1245], [1455, 1075]]);
					}
				}
			}
			color(c = [0.1000000000, 0.1000000000, 0.1000000000]) {
				translate(v = [0, 0, 1490.0000000000]) {
					linear_extrude(height = 686.1000000000) {
						polygon(paths = [[0, 1, 2, 3]], points = [[1975, 1075], [1975, 1245], [2145, 1245], [2145, 1075]]);
					}
				}
			}
			color(c = [0.1000000000, 0.1000000000, 0.1000000000]) {
				translate(v = [0, 0, 1490.0000000000]) {
					linear_extrude(height = 686.1000000000) {
						polygon(paths = [[0, 1, 2, 3]], points = [[175, 1575], [175, 1745], [345, 1745], [345, 1575]]);
					}
				}
			}
			color(c = [0.1000000000, 0.1000000000, 0.1000000000]) {
				translate(v = [0, 0, 1490.0000000000]) {
					linear_extrude(height = 686.1000000000) {
						polygon(paths = [[0, 1, 2, 3]], points = [[595, 1575], [595, 1745], [765, 1745], [765, 1575]]);
					}
				}
			}
			color(c = [0.1000000000, 0.1000000000, 0.1000000000]) {
				translate(v = [0, 0, 1490.0000000000]) {
					linear_extrude(height = 686.1000000000) {
						polygon(paths = [[0, 1, 2, 3]], points = [[1465, 1575], [1465, 1745], [1635, 1745], [1635, 1575]]);
					}
				}
			}
			color(c = [0.1000000000, 0.1000000000, 0.1000000000]) {
				translate(v = [0, 0, 1490.0000000000]) {
					linear_extrude(height = 686.1000000000) {
						polygon(paths = [[0, 1, 2, 3]], points = [[175, 1915], [175, 2085], [345, 2085], [345, 1915]]);
					}
				}
			}
			color(c = [0.1000000000, 0.1000000000, 0.1000000000]) {
				translate(v = [0, 0, 1490.0000000000]) {
					linear_extrude(height = 686.1000000000) {
						polygon(paths = [[0, 1, 2, 3]], points = [[595, 1915], [595, 2085], [765, 2085], [765, 1915]]);
					}
				}
			}
			color(c = [0.1000000000, 0.1000000000, 0.1000000000]) {
				translate(v = [0, 0, 1490.0000000000]) {
					linear_extrude(height = 686.1000000000) {
						polygon(paths = [[0, 1, 2, 3]], points = [[1015, 1915], [1015, 2085], [1185, 2085], [1185, 1915]]);
					}
				}
			}
			color(c = [0.1000000000, 0.1000000000, 0.1000000000]) {
				translate(v = [0, 0, 1490.0000000000]) {
					linear_extrude(height = 686.1000000000) {
						polygon(paths = [[0, 1, 2, 3]], points = [[1465, 1915], [1465, 2085], [1635, 2085], [1635, 1915]]);
					}
				}
			}
			color(c = [0.1000000000, 0.1000000000, 0.1000000000]) {
				translate(v = [0, 0, 1490.0000000000]) {
					linear_extrude(height = 686.1000000000) {
						polygon(paths = [[0, 1, 2, 3]], points = [[1915, 1915], [1915, 2085], [2085, 2085], [2085, 1915]]);
					}
				}
			}
			color(c = [0.1000000000, 0.1000000000, 0.1000000000]) {
				translate(v = [0, 0, 1490.0000000000]) {
					linear_extrude(height = 686.1000000000) {
						polygon(paths = [[0, 1, 2, 3]], points = [[175, 2255], [175, 2425], [345, 2425], [345, 2255]]);
					}
				}
			}
			color(c = [0.1000000000, 0.1000000000, 0.1000000000]) {
				translate(v = [0, 0, 1490.0000000000]) {
					linear_extrude(height = 686.1000000000) {
						polygon(paths = [[0, 1, 2, 3]], points = [[595, 2255], [595, 2425], [765, 2425], [765, 2255]]);
					}
				}
			}
			color(c = [0.1000000000, 0.1000000000, 0.1000000000]) {
				translate(v = [0, 0, 1490.0000000000]) {
					linear_extrude(height = 686.1000000000) {
						polygon(paths = [[0, 1, 2, 3]], points = [[1015, 2255], [1015, 2425], [1185, 2425], [1185, 2255]]);
					}
				}
			}
			color(c = [0.1000000000, 0.1000000000, 0.1000000000]) {
				translate(v = [0, 0, 1490.0000000000]) {
					linear_extrude(height = 686.1000000000) {
						polygon(paths = [[0, 1, 2, 3]], points = [[1465, 2255], [1465, 2425], [1635, 2425], [1635, 2255]]);
					}
				}
			}
			color(c = [0.1000000000, 0.1000000000, 0.1000000000]) {
				translate(v = [0, 0, 1490.0000000000]) {
					linear_extrude(height = 686.1000000000) {
						polygon(paths = [[0, 1, 2, 3]], points = [[1915, 2255], [1915, 2425], [2085, 2425], [2085, 2255]]);
					}
				}
			}
			color(c = [0.9000000000, 0.6000000000, 0.6000000000]) {
				translate(v = [0, 0, 2176.1000000000]) {
					linear_extrude(height = 100.0000000000) {
						polygon(paths = [[0, 1, 2, 3, 4, 5, 6, 7]], points = [[0, -85], [0, 85], [90, 85], [90, 825], [425, 825], [425, 85], [2300, 85], [2300, -85]]);
					}
				}
			}
			color(c = [0.9000000000, 0.6000000000, 0.6000000000]) {
				translate(v = [0, 0, 2176.1000000000]) {
					linear_extrude(height = 100.0000000000) {
						polygon(paths = [[0, 1, 2, 3]], points = [[110, 995], [110, 1325], [395, 1325], [395, 995]]);
					}
				}
			}
			color(c = [0.9000000000, 0.6000000000, 0.6000000000]) {
				translate(v = [0, 0, 2176.1000000000]) {
					linear_extrude(height = 100.0000000000) {
						polygon(paths = [[0, 1, 2, 3, 4, 5]], points = [[595, 300], [595, 1325], [975, 1325], [975, 995], [810, 995], [810, 300]]);
					}
				}
			}
			color(c = [0.9000000000, 0.6000000000, 0.6000000000]) {
				translate(v = [0, 0, 2176.1000000000]) {
					linear_extrude(height = 100.0000000000) {
						polygon(paths = [[0, 1, 2, 3, 4, 5, 6, 7]], points = [[1000, 300], [1000, 825], [1145, 825], [1145, 1325], [1455, 1325], [1455, 995], [1350, 995], [1350, 300]]);
					}
				}
			}
			color(c = [0.9000000000, 0.6000000000, 0.6000000000]) {
				translate(v = [0, 0, 2176.1000000000]) {
					linear_extrude(height = 100.0000000000) {
						polygon(paths = [[0, 1, 2, 3]], points = [[1975, 995], [1975, 1665], [2215, 1665], [2215, 995]]);
					}
				}
			}
			color(c = [0.9000000000, 0.6000000000, 0.6000000000]) {
				translate(v = [0, 0, 2176.1000000000]) {
					linear_extrude(height = 100.0000000000) {
						polygon(paths = [[0, 1, 2, 3, 4, 5, 6, 7, 8, 9, 10, 11, 12, 13, 14, 15]], points = [[1520, 255], [1520, 825], [1625, 825], [1625, 1495], [515, 1495], [515, 2465], [845, 2465], [845, 1665], [1385, 1665], [1385, 2465], [1715, 2465], [1715, 1665], [1795, 1665], [1795, 825], [2215, 825], [2215, 255]]);
					}
				}
			}
			color(c = [0.9000000000, 0.6000000000, 0.6000000000]) {
				translate(v = [0, 0, 2176.1000000000]) {
					linear_extrude(height = 100.0000000000) {
						polygon(paths = [[0, 1, 2, 3, 4, 5, 6, 7, 8, 9, 10, 11, 12, 13, 14, 15]], points = [[85, 1495], [85, 2635], [0, 2635], [0, 2805], [2300, 2805], [2300, 2635], [2195, 2635], [2195, 1835], [1915, 1835], [1915, 2635], [1185, 2635], [1185, 1835], [1015, 1835], [1015, 2635], [345, 2635], [345, 1495]]);
					}
				}
			}
			color(c = [0.5000000000, 0.5000000000, 0.5000000000]) {
				translate(v = [0, 0, 2276.1000000000]) {
					linear_extrude(height = 340.0000000000) {
						polygon(paths = [[0, 1, 2, 3]], points = [[145, -85], [145, 85], [315, 85], [315, -85]]);
					}
				}
			}
			color(c = [0.5000000000, 0.5000000000, 0.5000000000]) {
				translate(v = [0, 0, 2276.1000000000]) {
					linear_extrude(height = 340.0000000000) {
						polygon(paths = [[0, 1, 2, 3]], points = [[605, -85], [605, 85], [775, 85], [775, -85]]);
					}
				}
			}
			color(c = [0.5000000000, 0.5000000000, 0.5000000000]) {
				translate(v = [0, 0, 2276.1000000000]) {
					linear_extrude(height = 340.0000000000) {
						polygon(paths = [[0, 1, 2, 3]], points = [[1065, -85], [1065, 85], [1235, 85], [1235, -85]]);
					}
				}
			}
			color(c = [0.5000000000, 0.5000000000, 0.5000000000]) {
				translate(v = [0, 0, 2276.1000000000]) {
					linear_extrude(height = 340.0000000000) {
						polygon(paths = [[0, 1, 2, 3]], points = [[1525, -85], [1525, 85], [1695, 85], [1695, -85]]);
					}
				}
			}
			color(c = [0.5000000000, 0.5000000000, 0.5000000000]) {
				translate(v = [0, 0, 2276.1000000000]) {
					linear_extrude(height = 340.0000000000) {
						polygon(paths = [[0, 1, 2, 3]], points = [[1985, -85], [1985, 85], [2155, 85], [2155, -85]]);
					}
				}
			}
			color(c = [0.5000000000, 0.5000000000, 0.5000000000]) {
				translate(v = [0, 0, 2276.1000000000]) {
					linear_extrude(height = 340.0000000000) {
						polygon(paths = [[0, 1, 2, 3]], points = [[145, 2635], [145, 2805], [315, 2805], [315, 2635]]);
					}
				}
			}
			color(c = [0.5000000000, 0.5000000000, 0.5000000000]) {
				translate(v = [0, 0, 2276.1000000000]) {
					linear_extrude(height = 340.0000000000) {
						polygon(paths = [[0, 1, 2, 3]], points = [[605, 2635], [605, 2805], [775, 2805], [775, 2635]]);
					}
				}
			}
			color(c = [0.5000000000, 0.5000000000, 0.5000000000]) {
				translate(v = [0, 0, 2276.1000000000]) {
					linear_extrude(height = 340.0000000000) {
						polygon(paths = [[0, 1, 2, 3]], points = [[1065, 2635], [1065, 2805], [1235, 2805], [1235, 2635]]);
					}
				}
			}
			color(c = [0.5000000000, 0.5000000000, 0.5000000000]) {
				translate(v = [0, 0, 2276.1000000000]) {
					linear_extrude(height = 340.0000000000) {
						polygon(paths = [[0, 1, 2, 3]], points = [[1525, 2635], [1525, 2805], [1695, 2805], [1695, 2635]]);
					}
				}
			}
			color(c = [0.5000000000, 0.5000000000, 0.5000000000]) {
				translate(v = [0, 0, 2276.1000000000]) {
					linear_extrude(height = 340.0000000000) {
						polygon(paths = [[0, 1, 2, 3]], points = [[1985, 2635], [1985, 2805], [2155, 2805], [2155, 2635]]);
					}
				}
			}
			color(c = [0.3000000000, 0.3000000000, 1]) {
				translate(v = [0, 0, 2616.1000000000]) {
					linear_extrude(height = 360.0000000000) {
						polygon(paths = [[0, 1, 2, 3]], points = [[0, -240], [0, 240], [2300, 240], [2300, -240]]);
					}
				}
			}
			color(c = [0.3000000000, 0.3000000000, 1]) {
				translate(v = [0, 0, 2616.1000000000]) {
					linear_extrude(height = 360.0000000000) {
						polygon(paths = [[0, 1, 2, 3]], points = [[0, 2480], [0, 2960], [2300, 2960], [2300, 2480]]);
					}
				}
			}
		}
	}
}
